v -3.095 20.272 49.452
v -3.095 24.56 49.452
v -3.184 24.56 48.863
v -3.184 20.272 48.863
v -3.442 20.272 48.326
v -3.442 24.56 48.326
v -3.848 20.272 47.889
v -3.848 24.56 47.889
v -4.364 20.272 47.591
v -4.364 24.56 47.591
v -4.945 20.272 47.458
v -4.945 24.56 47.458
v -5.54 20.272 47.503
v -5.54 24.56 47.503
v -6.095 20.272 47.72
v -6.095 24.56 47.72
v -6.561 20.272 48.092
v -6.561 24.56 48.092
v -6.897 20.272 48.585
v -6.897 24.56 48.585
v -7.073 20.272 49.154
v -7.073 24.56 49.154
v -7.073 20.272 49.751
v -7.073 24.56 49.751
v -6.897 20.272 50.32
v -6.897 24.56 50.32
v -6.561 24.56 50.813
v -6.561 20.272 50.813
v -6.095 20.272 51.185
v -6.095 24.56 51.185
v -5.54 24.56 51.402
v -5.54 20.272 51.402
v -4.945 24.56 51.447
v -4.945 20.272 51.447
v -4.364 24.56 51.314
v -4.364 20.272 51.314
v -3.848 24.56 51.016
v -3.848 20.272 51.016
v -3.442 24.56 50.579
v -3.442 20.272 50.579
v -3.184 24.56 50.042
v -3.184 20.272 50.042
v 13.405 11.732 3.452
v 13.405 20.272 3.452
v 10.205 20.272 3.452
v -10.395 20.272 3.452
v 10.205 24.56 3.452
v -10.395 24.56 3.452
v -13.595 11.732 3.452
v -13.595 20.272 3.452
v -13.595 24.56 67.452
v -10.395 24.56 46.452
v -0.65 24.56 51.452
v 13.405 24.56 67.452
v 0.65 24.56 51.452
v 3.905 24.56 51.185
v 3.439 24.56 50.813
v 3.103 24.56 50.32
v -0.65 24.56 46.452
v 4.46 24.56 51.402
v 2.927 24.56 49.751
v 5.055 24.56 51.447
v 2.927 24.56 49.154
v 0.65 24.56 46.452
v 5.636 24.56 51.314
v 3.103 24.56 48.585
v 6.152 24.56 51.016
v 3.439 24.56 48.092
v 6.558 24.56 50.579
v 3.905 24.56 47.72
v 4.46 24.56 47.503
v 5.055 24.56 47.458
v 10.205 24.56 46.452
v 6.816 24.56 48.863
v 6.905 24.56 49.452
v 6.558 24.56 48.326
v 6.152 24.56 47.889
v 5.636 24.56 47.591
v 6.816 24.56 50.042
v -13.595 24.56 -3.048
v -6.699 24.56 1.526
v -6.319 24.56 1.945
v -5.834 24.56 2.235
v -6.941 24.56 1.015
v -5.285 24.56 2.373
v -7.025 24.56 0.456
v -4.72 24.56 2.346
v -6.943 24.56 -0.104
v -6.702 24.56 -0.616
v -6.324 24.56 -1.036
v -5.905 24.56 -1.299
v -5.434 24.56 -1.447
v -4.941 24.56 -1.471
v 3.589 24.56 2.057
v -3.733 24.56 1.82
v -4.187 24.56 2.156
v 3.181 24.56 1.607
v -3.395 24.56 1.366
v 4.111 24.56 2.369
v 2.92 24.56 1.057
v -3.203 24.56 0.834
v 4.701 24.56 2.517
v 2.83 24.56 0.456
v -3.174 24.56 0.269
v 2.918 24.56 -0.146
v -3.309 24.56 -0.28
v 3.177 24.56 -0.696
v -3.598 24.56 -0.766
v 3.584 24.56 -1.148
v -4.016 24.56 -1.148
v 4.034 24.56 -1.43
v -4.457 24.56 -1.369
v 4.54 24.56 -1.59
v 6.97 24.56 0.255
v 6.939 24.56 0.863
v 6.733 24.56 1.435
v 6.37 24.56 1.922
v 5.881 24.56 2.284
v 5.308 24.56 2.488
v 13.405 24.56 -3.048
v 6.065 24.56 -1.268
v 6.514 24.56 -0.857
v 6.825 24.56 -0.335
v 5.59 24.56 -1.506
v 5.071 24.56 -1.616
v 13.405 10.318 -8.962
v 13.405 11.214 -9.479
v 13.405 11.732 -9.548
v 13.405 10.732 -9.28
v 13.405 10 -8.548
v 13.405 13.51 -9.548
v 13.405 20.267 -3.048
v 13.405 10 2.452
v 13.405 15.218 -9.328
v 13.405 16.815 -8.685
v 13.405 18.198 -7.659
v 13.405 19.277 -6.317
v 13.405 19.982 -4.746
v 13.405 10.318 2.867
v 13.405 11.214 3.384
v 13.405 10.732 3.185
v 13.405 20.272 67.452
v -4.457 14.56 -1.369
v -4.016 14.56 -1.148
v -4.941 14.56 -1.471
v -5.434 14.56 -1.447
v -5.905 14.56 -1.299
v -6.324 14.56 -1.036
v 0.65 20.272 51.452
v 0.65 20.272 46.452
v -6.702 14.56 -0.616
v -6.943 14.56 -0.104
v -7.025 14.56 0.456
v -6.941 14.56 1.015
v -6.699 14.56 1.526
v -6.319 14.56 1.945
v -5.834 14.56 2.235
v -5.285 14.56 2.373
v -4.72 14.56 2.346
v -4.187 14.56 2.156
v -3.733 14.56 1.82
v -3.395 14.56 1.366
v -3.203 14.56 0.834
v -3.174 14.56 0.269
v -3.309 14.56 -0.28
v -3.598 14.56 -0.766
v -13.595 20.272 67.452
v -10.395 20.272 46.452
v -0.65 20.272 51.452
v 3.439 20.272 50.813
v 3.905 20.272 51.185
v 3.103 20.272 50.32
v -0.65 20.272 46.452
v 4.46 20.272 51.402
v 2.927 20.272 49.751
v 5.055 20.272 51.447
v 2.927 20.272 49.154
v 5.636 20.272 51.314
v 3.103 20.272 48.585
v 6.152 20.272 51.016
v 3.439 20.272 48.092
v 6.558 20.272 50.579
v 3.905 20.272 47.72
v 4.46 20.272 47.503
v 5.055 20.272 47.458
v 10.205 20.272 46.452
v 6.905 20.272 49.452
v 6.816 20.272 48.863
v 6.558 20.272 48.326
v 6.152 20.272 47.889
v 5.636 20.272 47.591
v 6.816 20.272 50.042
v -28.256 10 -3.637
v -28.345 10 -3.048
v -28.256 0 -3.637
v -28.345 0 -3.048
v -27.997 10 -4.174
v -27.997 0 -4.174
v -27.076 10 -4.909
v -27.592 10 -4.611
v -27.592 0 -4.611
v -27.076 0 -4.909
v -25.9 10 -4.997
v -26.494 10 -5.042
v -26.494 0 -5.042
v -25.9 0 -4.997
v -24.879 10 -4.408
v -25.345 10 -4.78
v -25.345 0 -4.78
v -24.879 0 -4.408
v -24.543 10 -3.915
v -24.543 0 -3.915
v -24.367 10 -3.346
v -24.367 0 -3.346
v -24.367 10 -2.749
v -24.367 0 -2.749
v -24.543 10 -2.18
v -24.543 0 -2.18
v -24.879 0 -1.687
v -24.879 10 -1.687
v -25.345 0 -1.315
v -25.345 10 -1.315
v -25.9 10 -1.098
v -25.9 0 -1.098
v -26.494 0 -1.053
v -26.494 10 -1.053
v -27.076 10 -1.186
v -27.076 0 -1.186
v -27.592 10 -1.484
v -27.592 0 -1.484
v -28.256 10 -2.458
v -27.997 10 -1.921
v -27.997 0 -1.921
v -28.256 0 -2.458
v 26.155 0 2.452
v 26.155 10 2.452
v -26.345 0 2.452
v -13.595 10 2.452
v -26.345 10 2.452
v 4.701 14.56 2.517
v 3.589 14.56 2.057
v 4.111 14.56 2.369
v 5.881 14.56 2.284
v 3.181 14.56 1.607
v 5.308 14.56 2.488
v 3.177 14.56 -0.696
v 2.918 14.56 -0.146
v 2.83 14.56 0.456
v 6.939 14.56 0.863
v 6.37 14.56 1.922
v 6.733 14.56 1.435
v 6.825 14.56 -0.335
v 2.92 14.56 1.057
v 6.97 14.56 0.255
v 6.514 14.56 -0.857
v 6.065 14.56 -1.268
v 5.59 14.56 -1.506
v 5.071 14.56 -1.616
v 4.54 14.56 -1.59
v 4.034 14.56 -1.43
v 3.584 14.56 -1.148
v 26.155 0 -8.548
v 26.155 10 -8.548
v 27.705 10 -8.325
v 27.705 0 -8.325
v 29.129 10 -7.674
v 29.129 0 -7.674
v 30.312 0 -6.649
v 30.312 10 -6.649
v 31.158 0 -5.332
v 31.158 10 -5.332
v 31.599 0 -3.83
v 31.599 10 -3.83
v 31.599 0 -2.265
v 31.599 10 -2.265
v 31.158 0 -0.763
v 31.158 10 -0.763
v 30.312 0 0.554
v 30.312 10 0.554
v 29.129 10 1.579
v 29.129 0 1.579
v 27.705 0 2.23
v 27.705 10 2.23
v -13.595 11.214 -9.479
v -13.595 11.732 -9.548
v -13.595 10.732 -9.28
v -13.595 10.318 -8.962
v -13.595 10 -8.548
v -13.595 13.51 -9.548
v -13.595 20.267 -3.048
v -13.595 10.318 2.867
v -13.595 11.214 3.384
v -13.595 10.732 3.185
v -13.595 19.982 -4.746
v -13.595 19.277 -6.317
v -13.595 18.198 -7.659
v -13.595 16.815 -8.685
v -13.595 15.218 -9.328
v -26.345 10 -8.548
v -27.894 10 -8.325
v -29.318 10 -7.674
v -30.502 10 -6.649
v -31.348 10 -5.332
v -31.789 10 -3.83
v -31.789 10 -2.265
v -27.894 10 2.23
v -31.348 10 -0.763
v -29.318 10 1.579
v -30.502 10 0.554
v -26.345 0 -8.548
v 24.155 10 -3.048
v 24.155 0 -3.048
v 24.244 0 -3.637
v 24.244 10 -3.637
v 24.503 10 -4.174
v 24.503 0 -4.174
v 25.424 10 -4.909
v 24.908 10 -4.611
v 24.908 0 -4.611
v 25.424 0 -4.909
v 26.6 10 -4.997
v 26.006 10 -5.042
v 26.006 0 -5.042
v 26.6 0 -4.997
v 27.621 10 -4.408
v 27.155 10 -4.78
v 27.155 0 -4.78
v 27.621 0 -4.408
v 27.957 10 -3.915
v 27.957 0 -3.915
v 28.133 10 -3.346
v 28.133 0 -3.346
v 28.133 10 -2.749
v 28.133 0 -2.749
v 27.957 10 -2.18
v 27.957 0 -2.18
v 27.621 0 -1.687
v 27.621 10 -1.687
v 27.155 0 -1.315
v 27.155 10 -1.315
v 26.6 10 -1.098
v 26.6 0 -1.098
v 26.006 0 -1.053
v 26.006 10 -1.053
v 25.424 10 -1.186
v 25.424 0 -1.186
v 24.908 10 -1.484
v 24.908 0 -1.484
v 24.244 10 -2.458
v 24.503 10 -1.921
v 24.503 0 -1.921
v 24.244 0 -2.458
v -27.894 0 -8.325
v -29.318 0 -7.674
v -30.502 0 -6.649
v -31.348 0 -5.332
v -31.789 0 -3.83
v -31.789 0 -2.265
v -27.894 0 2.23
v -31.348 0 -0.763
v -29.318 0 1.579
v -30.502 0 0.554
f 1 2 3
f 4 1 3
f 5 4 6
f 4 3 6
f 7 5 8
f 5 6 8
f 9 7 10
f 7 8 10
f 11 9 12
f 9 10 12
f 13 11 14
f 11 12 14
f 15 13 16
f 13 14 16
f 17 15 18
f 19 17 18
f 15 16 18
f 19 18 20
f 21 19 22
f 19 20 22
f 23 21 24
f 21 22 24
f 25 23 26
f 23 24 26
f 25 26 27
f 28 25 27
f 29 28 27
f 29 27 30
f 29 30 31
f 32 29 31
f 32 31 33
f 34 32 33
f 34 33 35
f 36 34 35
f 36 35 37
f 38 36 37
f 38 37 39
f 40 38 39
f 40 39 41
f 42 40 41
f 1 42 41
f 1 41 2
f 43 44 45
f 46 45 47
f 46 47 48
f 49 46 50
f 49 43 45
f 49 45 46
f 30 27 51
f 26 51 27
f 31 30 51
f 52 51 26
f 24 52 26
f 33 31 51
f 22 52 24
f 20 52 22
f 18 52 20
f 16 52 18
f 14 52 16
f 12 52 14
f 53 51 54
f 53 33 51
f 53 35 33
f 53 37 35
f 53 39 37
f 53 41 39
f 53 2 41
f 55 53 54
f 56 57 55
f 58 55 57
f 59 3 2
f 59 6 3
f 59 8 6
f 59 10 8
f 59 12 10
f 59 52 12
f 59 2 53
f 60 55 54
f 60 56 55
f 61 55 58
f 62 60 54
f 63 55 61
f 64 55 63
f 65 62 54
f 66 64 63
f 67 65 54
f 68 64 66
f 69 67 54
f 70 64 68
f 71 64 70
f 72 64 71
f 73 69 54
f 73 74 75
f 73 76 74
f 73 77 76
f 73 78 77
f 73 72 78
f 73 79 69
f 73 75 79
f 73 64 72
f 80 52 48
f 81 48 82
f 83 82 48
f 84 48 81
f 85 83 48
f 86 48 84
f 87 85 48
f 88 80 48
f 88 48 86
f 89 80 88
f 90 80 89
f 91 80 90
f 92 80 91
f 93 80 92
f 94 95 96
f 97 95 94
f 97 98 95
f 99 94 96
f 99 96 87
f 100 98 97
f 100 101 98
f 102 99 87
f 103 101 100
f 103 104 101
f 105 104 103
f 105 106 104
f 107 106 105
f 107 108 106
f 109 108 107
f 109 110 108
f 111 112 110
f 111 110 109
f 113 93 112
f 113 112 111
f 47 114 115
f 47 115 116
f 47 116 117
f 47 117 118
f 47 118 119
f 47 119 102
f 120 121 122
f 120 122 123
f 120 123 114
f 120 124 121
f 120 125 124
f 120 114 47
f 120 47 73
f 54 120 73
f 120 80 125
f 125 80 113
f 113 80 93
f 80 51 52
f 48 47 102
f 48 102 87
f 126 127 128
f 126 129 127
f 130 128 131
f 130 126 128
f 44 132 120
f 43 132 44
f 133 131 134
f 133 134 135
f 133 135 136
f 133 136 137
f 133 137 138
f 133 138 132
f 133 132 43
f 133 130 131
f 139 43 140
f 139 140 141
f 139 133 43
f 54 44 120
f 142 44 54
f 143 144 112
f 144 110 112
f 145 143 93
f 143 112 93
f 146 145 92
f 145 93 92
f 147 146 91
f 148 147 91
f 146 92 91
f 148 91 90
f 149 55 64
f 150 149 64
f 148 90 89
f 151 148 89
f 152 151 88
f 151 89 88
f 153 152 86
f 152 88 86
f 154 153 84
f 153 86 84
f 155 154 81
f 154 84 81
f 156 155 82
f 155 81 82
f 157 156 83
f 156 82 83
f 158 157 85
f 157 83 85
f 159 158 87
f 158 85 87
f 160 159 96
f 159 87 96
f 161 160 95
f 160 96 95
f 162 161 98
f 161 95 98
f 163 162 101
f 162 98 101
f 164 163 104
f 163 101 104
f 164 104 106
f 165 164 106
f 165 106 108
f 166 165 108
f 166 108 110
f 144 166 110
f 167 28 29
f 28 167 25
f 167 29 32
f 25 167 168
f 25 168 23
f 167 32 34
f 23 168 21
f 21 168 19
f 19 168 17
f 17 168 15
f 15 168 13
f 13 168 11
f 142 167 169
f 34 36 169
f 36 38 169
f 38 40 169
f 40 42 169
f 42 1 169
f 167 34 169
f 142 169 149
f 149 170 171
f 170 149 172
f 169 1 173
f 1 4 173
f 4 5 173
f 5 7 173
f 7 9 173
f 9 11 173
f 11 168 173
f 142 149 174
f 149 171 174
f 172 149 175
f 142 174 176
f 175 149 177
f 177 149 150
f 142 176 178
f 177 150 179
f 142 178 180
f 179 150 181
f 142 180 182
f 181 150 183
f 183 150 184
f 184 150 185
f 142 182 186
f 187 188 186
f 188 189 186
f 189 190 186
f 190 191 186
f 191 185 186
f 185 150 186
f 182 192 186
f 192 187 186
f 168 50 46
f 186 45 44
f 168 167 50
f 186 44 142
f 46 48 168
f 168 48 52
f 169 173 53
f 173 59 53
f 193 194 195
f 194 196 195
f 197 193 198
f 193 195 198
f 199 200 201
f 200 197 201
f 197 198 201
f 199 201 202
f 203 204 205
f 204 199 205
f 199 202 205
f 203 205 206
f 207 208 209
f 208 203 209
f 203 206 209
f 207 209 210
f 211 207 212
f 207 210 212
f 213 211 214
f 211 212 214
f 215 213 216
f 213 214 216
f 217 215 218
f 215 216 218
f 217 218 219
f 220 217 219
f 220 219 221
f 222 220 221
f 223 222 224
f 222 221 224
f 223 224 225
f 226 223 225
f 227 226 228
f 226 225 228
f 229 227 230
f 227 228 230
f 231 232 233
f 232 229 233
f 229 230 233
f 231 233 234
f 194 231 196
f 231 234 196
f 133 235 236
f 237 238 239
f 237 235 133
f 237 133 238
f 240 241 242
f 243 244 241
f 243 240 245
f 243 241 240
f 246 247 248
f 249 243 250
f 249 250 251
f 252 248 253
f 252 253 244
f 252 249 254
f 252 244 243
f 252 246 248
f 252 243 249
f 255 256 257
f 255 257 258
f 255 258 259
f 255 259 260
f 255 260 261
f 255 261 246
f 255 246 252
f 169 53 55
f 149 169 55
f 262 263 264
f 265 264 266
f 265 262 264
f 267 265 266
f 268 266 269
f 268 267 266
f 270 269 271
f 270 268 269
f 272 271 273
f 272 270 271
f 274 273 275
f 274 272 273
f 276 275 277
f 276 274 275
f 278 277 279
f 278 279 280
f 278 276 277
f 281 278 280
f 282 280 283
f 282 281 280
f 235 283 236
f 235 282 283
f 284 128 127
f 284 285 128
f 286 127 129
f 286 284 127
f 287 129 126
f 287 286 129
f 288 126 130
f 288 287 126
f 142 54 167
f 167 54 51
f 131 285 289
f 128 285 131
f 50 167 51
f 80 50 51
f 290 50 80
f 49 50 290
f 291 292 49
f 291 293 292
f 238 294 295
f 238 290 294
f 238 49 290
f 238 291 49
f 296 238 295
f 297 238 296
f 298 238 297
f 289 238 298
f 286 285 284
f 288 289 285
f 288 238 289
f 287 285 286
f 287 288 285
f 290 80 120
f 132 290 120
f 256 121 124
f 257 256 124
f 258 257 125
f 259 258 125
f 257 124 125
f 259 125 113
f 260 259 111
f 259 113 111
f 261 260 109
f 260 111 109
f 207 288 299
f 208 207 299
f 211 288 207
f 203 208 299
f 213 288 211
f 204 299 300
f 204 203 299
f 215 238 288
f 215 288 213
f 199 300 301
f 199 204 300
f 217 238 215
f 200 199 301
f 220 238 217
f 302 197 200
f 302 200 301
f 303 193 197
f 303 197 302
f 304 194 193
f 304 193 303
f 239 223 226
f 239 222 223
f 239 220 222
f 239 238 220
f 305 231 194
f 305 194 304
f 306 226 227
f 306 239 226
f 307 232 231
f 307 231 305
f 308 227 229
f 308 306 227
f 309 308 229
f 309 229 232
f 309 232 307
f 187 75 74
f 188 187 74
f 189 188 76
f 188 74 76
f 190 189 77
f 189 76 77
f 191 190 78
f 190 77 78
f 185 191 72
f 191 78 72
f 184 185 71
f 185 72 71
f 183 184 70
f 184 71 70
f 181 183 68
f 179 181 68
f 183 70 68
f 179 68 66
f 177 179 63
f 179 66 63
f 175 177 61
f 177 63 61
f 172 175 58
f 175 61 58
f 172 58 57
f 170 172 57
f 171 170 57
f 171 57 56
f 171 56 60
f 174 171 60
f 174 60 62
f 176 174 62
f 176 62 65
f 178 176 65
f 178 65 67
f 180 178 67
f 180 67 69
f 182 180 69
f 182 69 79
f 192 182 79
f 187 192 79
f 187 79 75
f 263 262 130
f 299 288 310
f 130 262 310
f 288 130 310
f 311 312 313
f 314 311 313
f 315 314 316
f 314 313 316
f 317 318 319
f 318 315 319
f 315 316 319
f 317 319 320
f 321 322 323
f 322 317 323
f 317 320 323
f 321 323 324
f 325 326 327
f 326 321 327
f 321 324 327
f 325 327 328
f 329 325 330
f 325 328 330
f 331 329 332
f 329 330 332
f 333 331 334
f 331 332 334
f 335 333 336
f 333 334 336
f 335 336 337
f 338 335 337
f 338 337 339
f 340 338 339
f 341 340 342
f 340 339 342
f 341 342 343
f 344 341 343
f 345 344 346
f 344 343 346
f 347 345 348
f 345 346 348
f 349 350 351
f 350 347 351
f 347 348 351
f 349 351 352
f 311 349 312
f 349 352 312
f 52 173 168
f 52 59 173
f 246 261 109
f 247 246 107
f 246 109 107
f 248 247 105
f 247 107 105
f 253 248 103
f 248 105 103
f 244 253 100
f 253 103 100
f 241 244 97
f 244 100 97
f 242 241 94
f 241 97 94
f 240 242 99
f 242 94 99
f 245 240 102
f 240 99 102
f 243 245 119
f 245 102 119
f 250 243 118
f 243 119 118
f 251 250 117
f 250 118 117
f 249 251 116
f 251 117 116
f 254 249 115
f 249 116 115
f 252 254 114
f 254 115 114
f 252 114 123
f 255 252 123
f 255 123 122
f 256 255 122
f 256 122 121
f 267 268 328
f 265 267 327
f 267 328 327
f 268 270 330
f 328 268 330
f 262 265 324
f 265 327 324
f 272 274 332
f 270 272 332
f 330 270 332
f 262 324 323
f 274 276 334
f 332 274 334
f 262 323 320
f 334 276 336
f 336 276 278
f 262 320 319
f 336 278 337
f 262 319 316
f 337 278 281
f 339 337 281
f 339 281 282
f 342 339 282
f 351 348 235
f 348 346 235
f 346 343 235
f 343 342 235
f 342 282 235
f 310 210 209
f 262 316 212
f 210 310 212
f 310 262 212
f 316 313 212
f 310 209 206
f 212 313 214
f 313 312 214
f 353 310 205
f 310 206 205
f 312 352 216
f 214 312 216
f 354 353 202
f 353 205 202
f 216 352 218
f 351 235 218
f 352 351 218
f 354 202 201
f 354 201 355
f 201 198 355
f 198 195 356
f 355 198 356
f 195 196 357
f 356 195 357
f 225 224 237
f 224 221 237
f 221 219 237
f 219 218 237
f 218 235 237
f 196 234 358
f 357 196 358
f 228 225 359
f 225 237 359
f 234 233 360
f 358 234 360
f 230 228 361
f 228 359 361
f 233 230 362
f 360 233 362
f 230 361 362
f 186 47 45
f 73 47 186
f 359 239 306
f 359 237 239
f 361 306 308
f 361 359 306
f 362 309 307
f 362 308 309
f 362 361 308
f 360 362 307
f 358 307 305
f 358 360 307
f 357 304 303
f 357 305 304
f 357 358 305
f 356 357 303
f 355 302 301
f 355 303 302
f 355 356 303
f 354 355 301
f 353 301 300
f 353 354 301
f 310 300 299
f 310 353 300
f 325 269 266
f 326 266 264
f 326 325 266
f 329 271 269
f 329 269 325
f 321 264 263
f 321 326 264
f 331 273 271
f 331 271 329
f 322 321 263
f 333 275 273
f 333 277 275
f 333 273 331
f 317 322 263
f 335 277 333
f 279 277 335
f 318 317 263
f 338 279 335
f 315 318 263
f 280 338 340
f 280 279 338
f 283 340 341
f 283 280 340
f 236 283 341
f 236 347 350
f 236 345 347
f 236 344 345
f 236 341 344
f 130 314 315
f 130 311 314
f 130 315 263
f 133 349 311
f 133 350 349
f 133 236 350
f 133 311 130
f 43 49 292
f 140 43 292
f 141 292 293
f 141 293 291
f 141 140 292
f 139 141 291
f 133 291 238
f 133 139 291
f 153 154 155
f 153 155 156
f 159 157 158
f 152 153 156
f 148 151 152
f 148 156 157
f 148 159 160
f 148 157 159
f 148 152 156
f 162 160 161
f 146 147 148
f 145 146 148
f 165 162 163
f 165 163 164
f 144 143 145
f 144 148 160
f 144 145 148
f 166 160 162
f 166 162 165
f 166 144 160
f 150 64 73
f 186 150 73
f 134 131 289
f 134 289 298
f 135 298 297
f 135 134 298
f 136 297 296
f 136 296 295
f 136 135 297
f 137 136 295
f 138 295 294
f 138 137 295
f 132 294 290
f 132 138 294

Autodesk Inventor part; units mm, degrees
ref_plane "YZ Plane" through (0, 0, 0) normal (1, 0, 0) x (0, 1, 0)
ref_plane "XZ Plane" through (0, 0, 0) normal (0, 1, 0) x (-1, 0, 0)
ref_plane "XY Plane" through (0, 0, 0) normal (0, 0, 1) x (1, 0, 0)
sketch "Sketch1" plane through (0, 0, 0) normal (0, 1, 0) x (-1, 0, 0)
  circle A0 centre (-26.1551, -3.0475) radius 2
  arc A1 (-34.9051, -0.0475) -> (-17.4051, -0.0475) centre (-26.1551, -0.0475) ccw
  arc A2 (17.5949, -0.0475) -> (35.0949, -0.0475) centre (26.3449, -0.0475) ccw
  circle A3 centre (26.3449, -3.0475) radius 2
  circle A4 centre (-26.1551, -3.0475) radius 2
  circle A5 centre (26.3449, -3.0475) radius 2
  circle A6 centre (26.3449, -0.0475) radius 8.75
  circle A7 centre (-26.1551, -0.0475) radius 8.75
  line L0 (-34.9051, -0.0475) -> (-17.4051, -0.0475)
  line L1 (17.5949, -0.0475) -> (35.0949, -0.0475)
  circle A8 centre (-26.1551, -3.0475) radius 5.5
  circle A9 centre (26.3449, -3.0475) radius 5.5
  line L2 (-26.1551, -8.5475) -> (26.3449, -8.5475)
  line L3 (-26.1551, 2.4525) -> (26.3449, 2.4525)
  point P0 (0, 0)
  dimension "d0" = 11
  dimension "d1" = 11
extrude "Extrusion1" add sketch "Sketch1" along normal blind 10 contours L2 A8 L0 A1 | A1 A7 L3 A6 A2 L2 | A7 L0 A8 L3 | A8 L0 | L0 A8 | A2 L1 A9 L2 | L3 A9 L1 A6 | A9 L1 | A9 L1 picked at (-18.6939, -1.0014) picked at (-20.5799, 1.133) picked at (18.8536, -1.0809) picked at (20.7697, 1.133)
sketch "Sketch2" plane through (0, 10, 0) normal (0, 1, 0) x (1, 0, 0)
  line L0 (26.1551, 8.5475) -> (-26.3449, 8.5475) projected
  line L1 (-26.3449, -2.4525) -> (26.1551, -2.4525) projected
  arc A0 (-26.3449, 8.5475) -> (-26.3449, -2.4525) centre (-26.3449, 3.0475) ccw projected
  arc A1 (26.1551, -2.4525) -> (26.1551, 8.5475) centre (26.1551, 3.0475) ccw projected
  line L2 (-31.8449, 3.0475) -> (31.6551, 3.0475)
  line L3 (13.4051, -3.4525) -> (-13.5949, -3.4525)
  line L4 (-13.5949, -3.4525) -> (-13.5949, 9.5475)
  line L5 (-13.5949, 9.5475) -> (13.4051, 9.5475)
  line L6 (13.4051, 9.5475) -> (13.4051, -3.4525)
  line L7 (13.4051, -3.4525) -> (-13.5949, 9.5475) construction
  line L8 (-13.5949, -3.4525) -> (13.4051, 9.5475) construction
  point P0 (0, 0)
  point P1 (-0.0949, 3.0475)
  dimension "d4" = 27
  dimension "d5" = 13
extrude "Extrusion2" add sketch "Sketch2" along normal blind 14.56 contours L6 L2 L4 L0 | L0 L4 L5 L6 | L6 L1 L4 L2 | L6 L3 L4 L1
fillet "Fillet1" radius 2 2 edges at (-0.0949, 10, 3.4525) (-0.0949, 10, -9.5475)
sketch "Sketch3" plane through (0, 24.56, 0) normal (0, 1, 0) x (1, 0, 0)
  arc A0 (-6.3236, 1.0357) -> (-4.0158, 1.1475) centre (-5.0949, -0.4525) ccw
  arc A1 (3.5842, 1.1475) -> (6.0652, 1.2676) centre (4.9051, -0.4525) ccw
  circle A2 centre (4.9051, -0.4525) radius 2.0748
  circle A3 centre (-5.0949, -0.4525) radius 1.9299
  line L0 (-13.5949, 9.5475) -> (-13.5949, -3.4525) projected
  line L1 (13.4051, 9.5475) -> (-13.5949, 9.5475) projected
  line L2 (-13.5949, -3.4525) -> (13.4051, -3.4525) projected
  line L3 (13.4051, -3.4525) -> (13.4051, 9.5475) projected
  point P0 (0, 0)
  point P1 (6.0652, 1.2676)
  point P2 (-4.0158, 1.1475)
  dimension "d12" = 8.5
  dimension "d13" = 8.5
extrude "Extrusion3" cut sketch "Sketch3" against normal blind 10 contours A3 A0 | A2 A1
sketch "Sketch4" plane through (0, 24.56, 0) normal (0, 1, 0) x (1, 0, 0)
  line L0 (13.4051, 9.5475) -> (-13.5949, 9.5475) projected
  line L1 (-13.5949, -2.4525) -> (-13.5949, 8.5475) projected
  line L2 (13.4051, 9.5475) -> (-13.5949, 9.5475)
  line L3 (-13.5949, 9.5475) -> (-13.5949, 3.0475)
  line L4 (-13.5949, 3.0475) -> (13.4051, 3.0475)
  line L5 (13.4051, 3.0475) -> (13.4051, 9.5475)
  point P0 (0, 0)
extrude "Extrusion4" cut sketch "Sketch4" against normal blind 4.2875
fillet "Fillet2" radius 6.7625 1 edges at (-0.0949, 20.2725, -9.5475)
sketch "Sketch5" plane through (0, 24.56, 0) normal (0, 1, 0) x (1, 0, 0)
  line L0 (-13.5949, -3.4525) -> (13.4051, -3.4525) projected
  line L1 (-10.3949, -3.4525) -> (-10.3949, -67.4525)
  line L2 (10.2051, -3.4525) -> (10.2051, -67.4525)
  line L3 (-13.5949, 3.0475) -> (-13.5949, -3.4525) projected
  circle A0 centre (-5.0949, -49.4525) radius 2
  line L4 (13.4051, -3.4525) -> (13.4051, 3.0475) projected
  circle A1 centre (4.9051, -49.4525) radius 2
  circle A2 centre (4.9051, -49.4525) radius 3
  circle A3 centre (-5.0949, -49.4525) radius 3
  line L5 (-10.3949, -67.4525) -> (10.2051, -67.4525)
  line L6 (-10.3949, -67.4525) -> (-13.5949, -67.4525)
  line L7 (-13.5949, -67.4525) -> (-13.5949, -3.4525)
  line L8 (10.2051, -67.4525) -> (13.4051, -67.4525)
  line L9 (13.4051, -67.4525) -> (13.4051, -3.4525)
  line L10 (-5.0949, -46.4525) -> (4.9051, -46.4525)
  line L11 (10.2051, -46.4525) -> (-10.3949, -46.4525)
  line L12 (-0.65, -46.4525) -> (-0.65, -51.4525)
  line L13 (-0.65, -51.4525) -> (0.65, -51.4525)
  line L14 (0.65, -51.4525) -> (0.65, -46.4525)
  line L15 (0, -46.4525) -> (-0.65, -51.4525) construction
  line L16 (0, -46.4525) -> (0.65, -51.4525) construction
  point P0 (0, 0)
  point P1 (13.4051, -0.2025)
  point P2 (4.9051, -46.4525)
  dimension "d28" = 6
  dimension "d29" = 6
  dimension "d19" = 3.2
  dimension "d20" = 64
  dimension "d21" = 3.2
  dimension "d22" = 64
  dimension "d23" = 46
  dimension "d24" = 8.5
  dimension "d25" = 4
  dimension "d26" = 8.5
  dimension "d27" = 4
  dimension "d30" = 1.3
extrude "Extrusion5" add sketch "Sketch5" against normal blind 4.2875 contours L0 L1 L6 L7 | L0 L9 L8 L2 | A2 | A3 | L11 L10 L12 L13 L14 L2 L5 L1
properties part number "Servo_Holder"
